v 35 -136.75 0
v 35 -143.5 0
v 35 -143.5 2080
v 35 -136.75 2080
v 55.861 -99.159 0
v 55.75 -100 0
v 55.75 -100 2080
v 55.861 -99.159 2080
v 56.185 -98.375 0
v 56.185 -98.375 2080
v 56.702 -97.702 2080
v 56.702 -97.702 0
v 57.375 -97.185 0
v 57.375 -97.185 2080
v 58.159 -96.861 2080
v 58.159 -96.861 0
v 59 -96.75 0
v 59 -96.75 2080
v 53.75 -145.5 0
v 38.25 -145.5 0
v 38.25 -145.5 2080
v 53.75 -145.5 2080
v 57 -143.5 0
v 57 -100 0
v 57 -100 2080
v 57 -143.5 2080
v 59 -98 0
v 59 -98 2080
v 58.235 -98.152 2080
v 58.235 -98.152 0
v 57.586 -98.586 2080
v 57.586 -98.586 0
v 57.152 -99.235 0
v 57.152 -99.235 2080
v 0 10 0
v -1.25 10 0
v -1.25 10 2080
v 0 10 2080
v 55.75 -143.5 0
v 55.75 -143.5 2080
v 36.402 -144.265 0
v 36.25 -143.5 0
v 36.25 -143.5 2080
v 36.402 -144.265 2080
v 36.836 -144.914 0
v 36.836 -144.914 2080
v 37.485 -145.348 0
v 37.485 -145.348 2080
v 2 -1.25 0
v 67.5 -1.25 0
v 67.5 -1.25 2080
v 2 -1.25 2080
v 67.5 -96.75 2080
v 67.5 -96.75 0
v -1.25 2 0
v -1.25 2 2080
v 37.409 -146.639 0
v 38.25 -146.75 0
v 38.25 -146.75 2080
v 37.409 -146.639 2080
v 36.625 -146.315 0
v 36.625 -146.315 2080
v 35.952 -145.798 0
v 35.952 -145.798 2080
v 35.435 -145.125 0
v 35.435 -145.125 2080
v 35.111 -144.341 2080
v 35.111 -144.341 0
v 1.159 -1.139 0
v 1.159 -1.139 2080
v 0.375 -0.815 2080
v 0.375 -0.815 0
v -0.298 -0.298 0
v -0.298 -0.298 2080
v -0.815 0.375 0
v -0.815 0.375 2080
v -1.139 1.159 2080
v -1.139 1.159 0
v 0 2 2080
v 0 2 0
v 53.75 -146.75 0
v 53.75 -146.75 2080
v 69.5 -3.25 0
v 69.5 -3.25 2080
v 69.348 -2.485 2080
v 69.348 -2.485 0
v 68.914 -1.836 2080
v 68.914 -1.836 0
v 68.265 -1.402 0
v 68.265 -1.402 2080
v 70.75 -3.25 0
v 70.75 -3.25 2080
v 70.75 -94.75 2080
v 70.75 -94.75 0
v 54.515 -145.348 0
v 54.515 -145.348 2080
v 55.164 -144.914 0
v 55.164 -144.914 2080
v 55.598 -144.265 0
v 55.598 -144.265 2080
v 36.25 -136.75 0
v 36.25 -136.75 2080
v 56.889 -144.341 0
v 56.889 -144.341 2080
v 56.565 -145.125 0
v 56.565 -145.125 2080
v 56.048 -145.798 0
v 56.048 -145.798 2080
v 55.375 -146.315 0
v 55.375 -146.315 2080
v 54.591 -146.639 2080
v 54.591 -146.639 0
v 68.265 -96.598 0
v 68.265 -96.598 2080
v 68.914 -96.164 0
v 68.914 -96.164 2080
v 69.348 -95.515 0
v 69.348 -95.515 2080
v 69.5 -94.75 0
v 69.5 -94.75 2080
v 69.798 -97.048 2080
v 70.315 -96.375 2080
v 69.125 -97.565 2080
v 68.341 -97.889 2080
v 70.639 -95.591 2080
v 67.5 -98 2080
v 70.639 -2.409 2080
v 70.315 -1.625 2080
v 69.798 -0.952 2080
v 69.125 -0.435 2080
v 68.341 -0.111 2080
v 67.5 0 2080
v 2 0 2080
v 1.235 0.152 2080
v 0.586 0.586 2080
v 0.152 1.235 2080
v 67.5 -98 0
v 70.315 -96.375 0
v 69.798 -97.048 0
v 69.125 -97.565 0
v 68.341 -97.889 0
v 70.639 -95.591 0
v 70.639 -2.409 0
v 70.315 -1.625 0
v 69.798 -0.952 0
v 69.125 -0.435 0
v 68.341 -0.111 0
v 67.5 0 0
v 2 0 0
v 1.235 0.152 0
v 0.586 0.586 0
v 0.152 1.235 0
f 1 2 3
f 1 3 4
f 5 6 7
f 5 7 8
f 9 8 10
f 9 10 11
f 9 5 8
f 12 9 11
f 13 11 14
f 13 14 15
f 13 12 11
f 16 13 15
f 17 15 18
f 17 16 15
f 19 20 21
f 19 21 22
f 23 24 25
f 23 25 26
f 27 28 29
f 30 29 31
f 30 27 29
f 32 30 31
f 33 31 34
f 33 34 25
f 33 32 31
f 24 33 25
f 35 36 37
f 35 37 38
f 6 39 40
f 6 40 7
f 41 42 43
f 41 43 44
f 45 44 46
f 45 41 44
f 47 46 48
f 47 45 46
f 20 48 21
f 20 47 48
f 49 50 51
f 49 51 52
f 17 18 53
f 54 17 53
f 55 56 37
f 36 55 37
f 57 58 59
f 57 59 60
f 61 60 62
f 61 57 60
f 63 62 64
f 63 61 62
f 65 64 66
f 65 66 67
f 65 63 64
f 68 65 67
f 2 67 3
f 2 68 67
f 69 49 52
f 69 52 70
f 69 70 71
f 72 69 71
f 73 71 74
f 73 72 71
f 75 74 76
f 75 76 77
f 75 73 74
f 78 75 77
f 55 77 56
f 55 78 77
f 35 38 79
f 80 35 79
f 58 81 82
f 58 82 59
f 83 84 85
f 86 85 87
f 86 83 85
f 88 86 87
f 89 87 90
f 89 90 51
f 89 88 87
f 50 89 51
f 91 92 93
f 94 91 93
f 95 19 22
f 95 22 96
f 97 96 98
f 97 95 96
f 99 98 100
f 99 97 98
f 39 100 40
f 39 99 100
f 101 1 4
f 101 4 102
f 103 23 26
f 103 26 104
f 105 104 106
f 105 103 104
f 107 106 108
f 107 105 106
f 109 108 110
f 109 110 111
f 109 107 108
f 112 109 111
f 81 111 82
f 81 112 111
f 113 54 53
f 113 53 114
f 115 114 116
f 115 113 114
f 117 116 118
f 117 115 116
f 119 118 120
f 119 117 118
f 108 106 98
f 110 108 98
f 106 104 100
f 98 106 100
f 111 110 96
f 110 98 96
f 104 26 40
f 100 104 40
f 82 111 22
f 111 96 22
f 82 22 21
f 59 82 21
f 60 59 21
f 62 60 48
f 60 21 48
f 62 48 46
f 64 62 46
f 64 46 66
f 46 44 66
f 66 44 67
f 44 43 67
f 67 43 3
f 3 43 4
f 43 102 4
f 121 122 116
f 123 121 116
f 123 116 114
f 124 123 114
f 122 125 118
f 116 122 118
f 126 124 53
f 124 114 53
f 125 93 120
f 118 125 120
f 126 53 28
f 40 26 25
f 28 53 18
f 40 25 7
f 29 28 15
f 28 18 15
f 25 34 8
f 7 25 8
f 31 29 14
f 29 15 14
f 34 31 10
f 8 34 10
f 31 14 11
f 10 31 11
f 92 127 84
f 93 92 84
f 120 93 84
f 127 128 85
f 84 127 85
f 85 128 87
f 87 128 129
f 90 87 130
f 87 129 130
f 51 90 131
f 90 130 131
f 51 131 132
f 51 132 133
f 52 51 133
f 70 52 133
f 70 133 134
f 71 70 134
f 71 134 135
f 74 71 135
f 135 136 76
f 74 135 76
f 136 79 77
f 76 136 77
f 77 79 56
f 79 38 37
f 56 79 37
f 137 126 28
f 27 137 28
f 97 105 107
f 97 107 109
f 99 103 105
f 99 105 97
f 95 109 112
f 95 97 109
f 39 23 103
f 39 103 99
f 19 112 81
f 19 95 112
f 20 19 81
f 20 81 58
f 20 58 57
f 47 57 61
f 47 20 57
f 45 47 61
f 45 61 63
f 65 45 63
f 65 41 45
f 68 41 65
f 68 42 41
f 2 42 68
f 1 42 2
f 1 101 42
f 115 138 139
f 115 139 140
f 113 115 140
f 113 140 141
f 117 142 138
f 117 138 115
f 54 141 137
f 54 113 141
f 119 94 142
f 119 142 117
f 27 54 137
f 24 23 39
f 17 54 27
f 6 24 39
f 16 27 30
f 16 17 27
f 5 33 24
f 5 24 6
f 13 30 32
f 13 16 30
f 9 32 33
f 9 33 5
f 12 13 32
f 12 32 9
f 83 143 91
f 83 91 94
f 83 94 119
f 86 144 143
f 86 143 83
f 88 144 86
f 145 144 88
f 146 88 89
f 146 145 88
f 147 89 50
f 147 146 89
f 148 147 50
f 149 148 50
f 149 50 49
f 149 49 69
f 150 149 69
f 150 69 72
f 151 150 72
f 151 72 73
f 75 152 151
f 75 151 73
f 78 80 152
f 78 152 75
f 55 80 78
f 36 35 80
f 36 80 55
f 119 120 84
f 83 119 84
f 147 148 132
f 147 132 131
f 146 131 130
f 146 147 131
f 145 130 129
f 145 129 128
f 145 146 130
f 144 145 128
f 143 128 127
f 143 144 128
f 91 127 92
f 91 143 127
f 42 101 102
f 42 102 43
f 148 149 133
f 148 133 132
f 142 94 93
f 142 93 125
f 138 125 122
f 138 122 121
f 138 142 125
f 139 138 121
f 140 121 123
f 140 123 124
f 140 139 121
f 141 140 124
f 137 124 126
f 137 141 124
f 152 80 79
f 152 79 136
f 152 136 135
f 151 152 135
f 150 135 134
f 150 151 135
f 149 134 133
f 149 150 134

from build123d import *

# Parameters (mm, degrees)
BASE_FLANGE1_DEPTH = 2080


# Sheet-metal steps are written as plain solids
with BuildPart() as part:
    # Sketch1 → Base-Flange1 (new body)
    with BuildSketch(Plane.XY):
        with BuildLine():
            Line((0, 10), (0, 2))
            ThreePointArc((0, 2), (0.585786438, 0.585786438), (2, 0))
            Line((2, 0), (67.5, 0))
            ThreePointArc((67.5, 0), (69.798097039, -0.951902961), (70.75, -3.25))
            Line((70.75, -3.25), (70.75, -94.75))
            ThreePointArc((70.75, -94.75), (69.798097039, -97.048097039), (67.5, -98))
            Line((67.5, -98), (59, -98))
            ThreePointArc((59, -98), (57.585786438, -98.585786438), (57, -100))
            Line((57, -100), (57, -143.5))
            ThreePointArc((57, -143.5), (56.048097039, -145.798097039), (53.75, -146.75))
            Line((53.75, -146.75), (38.25, -146.75))
            ThreePointArc((38.25, -146.75), (35.951902961, -145.798097039), (35, -143.5))
            Line((35, -143.5), (35, -136.75))
            Line((35, -136.75), (36.25, -136.75))
            Line((36.25, -136.75), (36.25, -143.5))
            ThreePointArc((36.25, -143.5), (36.835786438, -144.914213562), (38.25, -145.5))
            Line((38.25, -145.5), (53.75, -145.5))
            ThreePointArc((53.75, -145.5), (55.164213562, -144.914213562), (55.75, -143.5))
            Line((55.75, -143.5), (55.75, -100))
            ThreePointArc((55.75, -100), (56.701902961, -97.701902961), (59, -96.75))
            Line((59, -96.75), (67.5, -96.75))
            ThreePointArc((67.5, -96.75), (68.914213562, -96.164213562), (69.5, -94.75))
            Line((69.5, -94.75), (69.5, -3.25))
            ThreePointArc((69.5, -3.25), (68.914213562, -1.835786438), (67.5, -1.25))
            Line((67.5, -1.25), (2, -1.25))
            ThreePointArc((2, -1.25), (-0.298097039, -0.298097039), (-1.25, 2))
            Line((-1.25, 2), (-1.25, 10))
            Line((-1.25, 10), (0, 10))
        make_face()
    extrude(amount=BASE_FLANGE1_DEPTH)


solid = part.part
